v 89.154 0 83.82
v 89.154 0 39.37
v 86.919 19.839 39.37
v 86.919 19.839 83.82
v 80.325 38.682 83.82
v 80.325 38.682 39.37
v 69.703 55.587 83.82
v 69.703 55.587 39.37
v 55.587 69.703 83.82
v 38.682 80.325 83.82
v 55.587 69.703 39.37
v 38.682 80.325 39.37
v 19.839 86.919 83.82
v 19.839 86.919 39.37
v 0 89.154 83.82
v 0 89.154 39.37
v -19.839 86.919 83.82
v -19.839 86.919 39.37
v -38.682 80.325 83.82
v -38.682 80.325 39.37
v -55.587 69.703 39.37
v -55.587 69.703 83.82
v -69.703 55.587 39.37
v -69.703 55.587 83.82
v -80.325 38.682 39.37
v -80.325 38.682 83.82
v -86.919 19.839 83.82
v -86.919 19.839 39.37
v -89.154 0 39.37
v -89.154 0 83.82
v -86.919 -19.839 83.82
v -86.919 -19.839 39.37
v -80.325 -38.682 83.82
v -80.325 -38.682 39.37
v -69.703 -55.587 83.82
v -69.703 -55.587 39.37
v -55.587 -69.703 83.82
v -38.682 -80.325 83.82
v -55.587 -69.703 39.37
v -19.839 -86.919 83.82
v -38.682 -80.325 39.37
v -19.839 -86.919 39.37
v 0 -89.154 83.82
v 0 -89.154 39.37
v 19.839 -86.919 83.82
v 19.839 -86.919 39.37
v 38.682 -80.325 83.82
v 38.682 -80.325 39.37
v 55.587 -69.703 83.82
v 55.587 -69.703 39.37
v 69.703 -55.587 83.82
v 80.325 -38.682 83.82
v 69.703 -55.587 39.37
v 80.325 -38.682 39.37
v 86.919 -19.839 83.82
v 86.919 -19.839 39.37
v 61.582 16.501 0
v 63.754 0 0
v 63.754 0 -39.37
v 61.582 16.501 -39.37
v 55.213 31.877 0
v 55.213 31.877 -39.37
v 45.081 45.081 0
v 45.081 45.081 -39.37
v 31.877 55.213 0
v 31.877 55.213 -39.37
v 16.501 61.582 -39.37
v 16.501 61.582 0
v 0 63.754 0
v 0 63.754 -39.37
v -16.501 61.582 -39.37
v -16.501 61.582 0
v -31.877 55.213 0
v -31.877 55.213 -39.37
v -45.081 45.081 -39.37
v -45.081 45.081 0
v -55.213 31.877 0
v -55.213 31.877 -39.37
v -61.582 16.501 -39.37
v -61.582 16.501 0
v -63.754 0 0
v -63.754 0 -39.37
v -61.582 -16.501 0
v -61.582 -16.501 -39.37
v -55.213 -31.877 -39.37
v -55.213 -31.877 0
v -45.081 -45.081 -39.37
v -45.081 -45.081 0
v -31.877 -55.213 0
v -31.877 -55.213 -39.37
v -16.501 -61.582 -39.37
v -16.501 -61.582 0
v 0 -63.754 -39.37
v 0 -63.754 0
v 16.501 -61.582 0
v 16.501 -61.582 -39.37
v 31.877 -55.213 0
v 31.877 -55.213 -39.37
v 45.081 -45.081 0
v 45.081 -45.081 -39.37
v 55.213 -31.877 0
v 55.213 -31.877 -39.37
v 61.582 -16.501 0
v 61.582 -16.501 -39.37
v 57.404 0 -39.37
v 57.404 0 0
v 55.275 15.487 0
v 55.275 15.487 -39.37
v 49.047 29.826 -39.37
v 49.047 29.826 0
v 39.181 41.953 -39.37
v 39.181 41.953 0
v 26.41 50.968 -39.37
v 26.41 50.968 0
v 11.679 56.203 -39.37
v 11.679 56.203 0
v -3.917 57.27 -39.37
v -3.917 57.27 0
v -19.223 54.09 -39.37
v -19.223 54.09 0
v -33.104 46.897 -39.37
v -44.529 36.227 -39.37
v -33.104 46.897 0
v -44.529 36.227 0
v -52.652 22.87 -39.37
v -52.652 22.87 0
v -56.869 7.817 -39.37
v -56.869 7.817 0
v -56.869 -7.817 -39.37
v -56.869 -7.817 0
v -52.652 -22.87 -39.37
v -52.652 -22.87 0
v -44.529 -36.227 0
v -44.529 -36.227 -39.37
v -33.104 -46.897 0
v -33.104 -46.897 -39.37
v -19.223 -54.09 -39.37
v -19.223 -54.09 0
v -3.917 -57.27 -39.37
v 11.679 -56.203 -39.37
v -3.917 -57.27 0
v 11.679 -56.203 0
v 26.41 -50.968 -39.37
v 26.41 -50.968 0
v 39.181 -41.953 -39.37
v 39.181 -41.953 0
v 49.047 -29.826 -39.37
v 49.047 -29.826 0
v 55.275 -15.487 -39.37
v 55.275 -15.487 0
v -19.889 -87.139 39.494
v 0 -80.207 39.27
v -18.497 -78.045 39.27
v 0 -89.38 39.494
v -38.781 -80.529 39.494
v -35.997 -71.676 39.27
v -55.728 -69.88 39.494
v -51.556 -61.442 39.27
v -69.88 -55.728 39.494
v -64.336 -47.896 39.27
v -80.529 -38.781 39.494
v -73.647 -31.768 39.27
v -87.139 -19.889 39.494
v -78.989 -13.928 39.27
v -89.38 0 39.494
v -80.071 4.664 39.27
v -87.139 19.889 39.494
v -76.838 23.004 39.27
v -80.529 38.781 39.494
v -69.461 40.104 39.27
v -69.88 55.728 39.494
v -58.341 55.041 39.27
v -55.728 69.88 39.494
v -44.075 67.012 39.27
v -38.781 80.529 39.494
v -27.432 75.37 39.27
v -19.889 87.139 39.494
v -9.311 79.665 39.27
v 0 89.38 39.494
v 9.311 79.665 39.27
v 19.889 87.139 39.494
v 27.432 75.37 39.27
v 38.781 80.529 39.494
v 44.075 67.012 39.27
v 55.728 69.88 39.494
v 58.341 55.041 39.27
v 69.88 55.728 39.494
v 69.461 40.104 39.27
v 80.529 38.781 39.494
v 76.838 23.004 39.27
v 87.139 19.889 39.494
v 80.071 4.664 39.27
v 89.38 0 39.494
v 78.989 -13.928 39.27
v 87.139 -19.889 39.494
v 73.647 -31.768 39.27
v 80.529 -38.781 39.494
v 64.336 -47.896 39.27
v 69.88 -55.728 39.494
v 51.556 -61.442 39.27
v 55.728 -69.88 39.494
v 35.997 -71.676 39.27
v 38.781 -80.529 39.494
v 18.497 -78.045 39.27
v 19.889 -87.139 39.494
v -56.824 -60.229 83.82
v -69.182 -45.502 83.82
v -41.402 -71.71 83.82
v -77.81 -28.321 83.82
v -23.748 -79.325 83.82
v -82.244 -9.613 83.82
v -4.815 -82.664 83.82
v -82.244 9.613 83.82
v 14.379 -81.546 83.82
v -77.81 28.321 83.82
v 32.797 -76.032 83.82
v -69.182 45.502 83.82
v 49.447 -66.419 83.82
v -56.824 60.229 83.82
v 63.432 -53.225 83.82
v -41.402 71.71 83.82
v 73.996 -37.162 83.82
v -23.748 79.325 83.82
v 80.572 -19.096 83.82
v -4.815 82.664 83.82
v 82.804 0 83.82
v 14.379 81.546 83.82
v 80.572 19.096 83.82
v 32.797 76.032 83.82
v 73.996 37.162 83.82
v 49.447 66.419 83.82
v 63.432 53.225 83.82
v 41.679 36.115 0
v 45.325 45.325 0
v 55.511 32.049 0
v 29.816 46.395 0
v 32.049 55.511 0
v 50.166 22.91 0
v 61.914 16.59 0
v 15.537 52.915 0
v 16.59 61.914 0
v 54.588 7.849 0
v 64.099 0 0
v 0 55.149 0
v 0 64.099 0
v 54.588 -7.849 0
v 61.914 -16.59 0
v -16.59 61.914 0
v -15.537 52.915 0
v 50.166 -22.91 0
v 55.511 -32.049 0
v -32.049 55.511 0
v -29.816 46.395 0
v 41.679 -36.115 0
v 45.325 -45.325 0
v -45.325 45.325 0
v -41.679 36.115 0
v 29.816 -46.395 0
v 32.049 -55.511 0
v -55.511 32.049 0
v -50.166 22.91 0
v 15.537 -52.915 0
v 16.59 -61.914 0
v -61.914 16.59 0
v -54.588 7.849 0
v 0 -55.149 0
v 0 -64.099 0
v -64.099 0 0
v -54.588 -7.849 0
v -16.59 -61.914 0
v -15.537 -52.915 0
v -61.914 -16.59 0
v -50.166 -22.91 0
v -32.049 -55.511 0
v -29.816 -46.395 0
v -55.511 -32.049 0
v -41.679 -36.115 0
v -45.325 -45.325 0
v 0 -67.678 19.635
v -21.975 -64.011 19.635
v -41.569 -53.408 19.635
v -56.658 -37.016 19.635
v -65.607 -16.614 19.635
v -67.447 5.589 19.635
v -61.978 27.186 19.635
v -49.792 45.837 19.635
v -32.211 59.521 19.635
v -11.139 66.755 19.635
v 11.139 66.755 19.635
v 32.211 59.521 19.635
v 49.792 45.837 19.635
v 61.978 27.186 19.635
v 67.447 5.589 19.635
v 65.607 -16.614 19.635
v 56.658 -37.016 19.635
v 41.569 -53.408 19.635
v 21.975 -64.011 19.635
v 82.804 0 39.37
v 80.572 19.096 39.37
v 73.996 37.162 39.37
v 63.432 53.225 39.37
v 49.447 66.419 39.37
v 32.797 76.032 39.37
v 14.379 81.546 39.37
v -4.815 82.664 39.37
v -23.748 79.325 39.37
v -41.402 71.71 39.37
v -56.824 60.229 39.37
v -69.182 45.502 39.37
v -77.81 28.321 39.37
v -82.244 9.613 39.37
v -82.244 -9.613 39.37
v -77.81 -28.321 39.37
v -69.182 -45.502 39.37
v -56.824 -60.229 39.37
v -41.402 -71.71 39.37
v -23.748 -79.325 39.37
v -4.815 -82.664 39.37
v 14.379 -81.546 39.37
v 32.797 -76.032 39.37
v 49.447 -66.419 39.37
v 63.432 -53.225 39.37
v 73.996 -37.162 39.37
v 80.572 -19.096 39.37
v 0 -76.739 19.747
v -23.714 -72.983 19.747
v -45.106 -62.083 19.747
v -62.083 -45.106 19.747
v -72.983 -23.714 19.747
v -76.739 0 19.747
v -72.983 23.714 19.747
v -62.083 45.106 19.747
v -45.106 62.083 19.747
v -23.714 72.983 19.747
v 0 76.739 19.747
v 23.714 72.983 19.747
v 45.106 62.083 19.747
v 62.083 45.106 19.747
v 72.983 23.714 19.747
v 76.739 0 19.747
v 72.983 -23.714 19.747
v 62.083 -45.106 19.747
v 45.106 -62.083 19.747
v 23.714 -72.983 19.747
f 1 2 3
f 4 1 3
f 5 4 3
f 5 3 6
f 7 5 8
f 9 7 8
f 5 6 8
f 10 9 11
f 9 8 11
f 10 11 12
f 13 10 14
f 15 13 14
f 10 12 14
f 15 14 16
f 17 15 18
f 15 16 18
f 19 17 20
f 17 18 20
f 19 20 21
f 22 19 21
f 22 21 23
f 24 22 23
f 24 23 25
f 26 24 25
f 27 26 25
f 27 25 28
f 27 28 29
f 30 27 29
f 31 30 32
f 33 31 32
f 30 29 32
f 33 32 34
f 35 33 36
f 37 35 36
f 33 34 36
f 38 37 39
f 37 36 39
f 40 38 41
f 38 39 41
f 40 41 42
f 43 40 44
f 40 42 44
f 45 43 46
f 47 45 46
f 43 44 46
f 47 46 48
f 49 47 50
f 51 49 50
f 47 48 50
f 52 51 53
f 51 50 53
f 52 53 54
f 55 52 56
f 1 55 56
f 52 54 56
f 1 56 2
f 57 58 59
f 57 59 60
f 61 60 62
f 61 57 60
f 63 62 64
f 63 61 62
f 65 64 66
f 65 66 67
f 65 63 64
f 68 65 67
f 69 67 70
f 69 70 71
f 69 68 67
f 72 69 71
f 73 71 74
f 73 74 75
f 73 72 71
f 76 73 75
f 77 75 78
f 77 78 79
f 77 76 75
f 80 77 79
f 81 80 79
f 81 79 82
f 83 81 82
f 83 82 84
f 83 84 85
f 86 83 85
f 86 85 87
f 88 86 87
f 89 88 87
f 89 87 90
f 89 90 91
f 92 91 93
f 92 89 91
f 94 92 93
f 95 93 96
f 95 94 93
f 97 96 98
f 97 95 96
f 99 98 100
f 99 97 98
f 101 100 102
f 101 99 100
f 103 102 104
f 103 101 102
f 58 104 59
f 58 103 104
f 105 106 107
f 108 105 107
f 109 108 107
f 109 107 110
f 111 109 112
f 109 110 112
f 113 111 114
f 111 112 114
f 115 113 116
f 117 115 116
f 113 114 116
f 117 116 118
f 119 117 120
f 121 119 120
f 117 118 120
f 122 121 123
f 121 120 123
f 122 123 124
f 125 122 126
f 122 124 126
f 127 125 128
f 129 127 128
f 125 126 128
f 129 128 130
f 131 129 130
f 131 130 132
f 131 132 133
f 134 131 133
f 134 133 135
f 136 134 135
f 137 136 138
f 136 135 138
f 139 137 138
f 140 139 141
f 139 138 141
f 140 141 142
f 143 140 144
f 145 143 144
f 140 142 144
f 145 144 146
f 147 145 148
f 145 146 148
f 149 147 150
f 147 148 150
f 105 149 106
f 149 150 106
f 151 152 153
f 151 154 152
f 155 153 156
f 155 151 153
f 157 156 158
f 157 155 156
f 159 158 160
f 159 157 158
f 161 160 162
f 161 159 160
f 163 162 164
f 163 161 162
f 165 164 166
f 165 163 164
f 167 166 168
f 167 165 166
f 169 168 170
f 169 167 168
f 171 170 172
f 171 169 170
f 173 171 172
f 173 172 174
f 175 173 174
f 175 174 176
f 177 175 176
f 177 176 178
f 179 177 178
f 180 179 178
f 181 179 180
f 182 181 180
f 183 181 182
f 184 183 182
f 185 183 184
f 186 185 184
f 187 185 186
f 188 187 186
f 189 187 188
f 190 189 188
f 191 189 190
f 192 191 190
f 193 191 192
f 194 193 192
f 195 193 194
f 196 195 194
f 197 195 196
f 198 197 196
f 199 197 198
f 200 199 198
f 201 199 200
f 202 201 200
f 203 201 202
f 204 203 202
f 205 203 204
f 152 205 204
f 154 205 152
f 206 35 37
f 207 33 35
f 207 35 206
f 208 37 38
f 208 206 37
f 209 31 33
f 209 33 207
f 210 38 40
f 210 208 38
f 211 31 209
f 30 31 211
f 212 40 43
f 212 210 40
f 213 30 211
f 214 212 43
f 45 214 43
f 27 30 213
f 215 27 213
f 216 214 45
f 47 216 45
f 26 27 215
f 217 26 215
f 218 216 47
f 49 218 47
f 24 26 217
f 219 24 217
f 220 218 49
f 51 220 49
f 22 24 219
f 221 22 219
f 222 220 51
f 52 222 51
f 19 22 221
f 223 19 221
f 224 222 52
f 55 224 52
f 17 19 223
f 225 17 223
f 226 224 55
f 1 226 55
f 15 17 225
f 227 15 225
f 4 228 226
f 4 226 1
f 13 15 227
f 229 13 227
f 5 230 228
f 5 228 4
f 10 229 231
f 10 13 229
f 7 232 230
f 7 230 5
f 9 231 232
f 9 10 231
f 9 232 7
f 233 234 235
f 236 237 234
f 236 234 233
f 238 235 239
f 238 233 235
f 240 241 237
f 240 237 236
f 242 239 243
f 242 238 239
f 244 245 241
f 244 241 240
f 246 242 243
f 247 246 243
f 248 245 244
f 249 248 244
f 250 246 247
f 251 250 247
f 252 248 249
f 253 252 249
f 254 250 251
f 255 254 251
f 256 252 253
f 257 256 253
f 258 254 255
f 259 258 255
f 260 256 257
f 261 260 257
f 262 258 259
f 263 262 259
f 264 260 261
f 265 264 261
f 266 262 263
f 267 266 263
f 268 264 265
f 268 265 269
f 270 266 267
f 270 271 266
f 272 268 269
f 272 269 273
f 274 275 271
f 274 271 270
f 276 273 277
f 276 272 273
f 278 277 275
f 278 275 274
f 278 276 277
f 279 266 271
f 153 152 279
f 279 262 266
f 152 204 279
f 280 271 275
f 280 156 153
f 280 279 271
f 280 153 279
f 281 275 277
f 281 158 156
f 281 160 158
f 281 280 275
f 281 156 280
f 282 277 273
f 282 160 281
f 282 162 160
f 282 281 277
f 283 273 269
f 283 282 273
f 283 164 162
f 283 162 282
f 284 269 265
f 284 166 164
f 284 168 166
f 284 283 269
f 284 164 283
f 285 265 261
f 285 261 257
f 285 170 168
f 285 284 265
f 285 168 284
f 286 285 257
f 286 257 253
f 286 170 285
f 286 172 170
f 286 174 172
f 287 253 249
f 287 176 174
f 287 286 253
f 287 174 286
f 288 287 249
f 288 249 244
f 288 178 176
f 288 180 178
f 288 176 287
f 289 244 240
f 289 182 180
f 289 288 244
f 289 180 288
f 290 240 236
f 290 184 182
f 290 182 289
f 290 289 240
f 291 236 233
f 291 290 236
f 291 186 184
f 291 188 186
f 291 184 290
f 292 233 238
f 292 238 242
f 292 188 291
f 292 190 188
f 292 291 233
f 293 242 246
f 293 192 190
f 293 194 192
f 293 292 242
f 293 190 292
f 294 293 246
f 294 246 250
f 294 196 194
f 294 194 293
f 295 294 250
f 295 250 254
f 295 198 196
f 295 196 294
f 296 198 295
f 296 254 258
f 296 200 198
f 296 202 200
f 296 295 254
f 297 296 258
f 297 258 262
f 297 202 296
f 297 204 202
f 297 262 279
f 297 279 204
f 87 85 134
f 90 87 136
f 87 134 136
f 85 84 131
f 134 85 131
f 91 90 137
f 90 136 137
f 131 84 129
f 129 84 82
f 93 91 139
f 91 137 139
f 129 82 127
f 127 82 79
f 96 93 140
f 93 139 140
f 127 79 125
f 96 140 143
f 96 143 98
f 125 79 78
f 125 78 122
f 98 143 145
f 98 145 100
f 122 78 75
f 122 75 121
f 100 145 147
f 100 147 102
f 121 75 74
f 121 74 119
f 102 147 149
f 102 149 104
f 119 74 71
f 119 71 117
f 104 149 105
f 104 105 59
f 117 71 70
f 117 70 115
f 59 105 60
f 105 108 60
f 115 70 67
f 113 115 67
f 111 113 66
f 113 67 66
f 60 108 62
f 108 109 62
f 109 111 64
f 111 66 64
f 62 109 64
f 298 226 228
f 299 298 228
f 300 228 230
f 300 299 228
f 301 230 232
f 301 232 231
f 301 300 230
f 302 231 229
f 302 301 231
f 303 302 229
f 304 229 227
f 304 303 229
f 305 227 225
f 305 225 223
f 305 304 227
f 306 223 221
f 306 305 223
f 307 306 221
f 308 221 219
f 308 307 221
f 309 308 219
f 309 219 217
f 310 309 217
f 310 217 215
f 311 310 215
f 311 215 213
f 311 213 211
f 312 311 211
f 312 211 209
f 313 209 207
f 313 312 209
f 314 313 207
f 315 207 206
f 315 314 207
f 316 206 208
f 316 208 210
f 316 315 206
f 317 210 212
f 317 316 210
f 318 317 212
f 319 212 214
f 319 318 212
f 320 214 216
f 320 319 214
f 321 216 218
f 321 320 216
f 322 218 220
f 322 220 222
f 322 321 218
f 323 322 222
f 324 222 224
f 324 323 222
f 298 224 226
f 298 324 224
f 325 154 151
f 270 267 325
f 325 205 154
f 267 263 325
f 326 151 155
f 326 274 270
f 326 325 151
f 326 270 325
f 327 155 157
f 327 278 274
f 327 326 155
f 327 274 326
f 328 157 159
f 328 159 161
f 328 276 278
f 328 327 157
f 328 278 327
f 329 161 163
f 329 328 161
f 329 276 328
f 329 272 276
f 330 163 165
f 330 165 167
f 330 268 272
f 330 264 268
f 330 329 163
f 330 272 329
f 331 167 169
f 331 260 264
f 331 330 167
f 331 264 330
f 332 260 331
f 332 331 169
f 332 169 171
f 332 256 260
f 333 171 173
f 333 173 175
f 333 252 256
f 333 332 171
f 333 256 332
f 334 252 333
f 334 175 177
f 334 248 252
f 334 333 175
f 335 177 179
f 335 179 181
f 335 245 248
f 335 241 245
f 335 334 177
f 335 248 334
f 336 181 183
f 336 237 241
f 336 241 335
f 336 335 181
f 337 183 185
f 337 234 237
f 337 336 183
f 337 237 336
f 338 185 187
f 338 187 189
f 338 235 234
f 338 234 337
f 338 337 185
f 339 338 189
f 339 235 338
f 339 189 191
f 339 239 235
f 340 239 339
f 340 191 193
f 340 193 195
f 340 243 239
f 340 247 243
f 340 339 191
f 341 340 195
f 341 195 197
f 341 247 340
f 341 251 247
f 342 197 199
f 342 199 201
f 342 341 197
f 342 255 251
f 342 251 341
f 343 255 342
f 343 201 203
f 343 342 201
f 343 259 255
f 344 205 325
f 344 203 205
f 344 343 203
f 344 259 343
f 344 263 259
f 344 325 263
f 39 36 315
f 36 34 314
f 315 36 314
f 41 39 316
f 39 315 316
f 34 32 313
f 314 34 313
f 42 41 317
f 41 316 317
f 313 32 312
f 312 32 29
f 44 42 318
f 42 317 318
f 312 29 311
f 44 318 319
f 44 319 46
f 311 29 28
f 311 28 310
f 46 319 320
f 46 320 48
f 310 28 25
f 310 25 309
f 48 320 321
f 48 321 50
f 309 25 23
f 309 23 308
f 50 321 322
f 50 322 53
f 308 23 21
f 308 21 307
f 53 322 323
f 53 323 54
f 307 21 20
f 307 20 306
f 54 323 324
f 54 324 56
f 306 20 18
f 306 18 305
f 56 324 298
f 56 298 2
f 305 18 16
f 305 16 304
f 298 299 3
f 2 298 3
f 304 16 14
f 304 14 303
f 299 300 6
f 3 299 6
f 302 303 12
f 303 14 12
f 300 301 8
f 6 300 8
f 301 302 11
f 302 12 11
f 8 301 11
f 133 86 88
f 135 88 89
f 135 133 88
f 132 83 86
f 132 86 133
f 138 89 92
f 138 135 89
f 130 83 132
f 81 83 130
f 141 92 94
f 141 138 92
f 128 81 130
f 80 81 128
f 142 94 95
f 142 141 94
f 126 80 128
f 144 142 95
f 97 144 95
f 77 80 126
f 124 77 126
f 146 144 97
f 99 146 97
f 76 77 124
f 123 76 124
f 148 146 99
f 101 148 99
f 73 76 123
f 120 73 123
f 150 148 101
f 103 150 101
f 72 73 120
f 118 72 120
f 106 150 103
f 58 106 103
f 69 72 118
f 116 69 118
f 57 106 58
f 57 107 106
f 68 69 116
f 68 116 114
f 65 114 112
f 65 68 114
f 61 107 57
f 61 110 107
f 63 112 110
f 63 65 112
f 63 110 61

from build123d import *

# Parameters (mm, degrees)
F1_R     = 63.754
F2_DEPTH = 39.37
F0_R     = 57.404
F3_DEPTH = 39.37
F5_R     = 89.154
F5_R_2   = 82.804
F6_DEPTH = 44.45


with BuildPart() as f2:
    # F1 (on Top) → F2 (new body)
    with BuildSketch(Plane.XY):
        Circle(F1_R)
    extrude(amount=-F2_DEPTH)

    # F0 (on Top) → F3 (cut)
    with BuildSketch(Plane.XY):
        Circle(F0_R)
    extrude(amount=-F3_DEPTH, mode=Mode.SUBTRACT)


with BuildPart() as f6:
    # F5 (on offset) → F6 (new body)
    with BuildSketch(Plane.XY.offset(39.37)):
        Circle(F5_R)
        Circle(F5_R_2, mode=Mode.SUBTRACT)
    extrude(amount=F6_DEPTH)


with BuildPart() as f8:
    # F7 (on Right) → F8 (revolve)
    with BuildSketch(Plane.YZ):
        Polygon((-80.207095, 39.269883), (-89.380011, 39.493617), (-64.098559, 0), (-55.149369, 0), align=None)
    revolve(axis=Axis((0, 0, 19.411214), (0, 0, -1)))


solid = Compound([f2.part, f6.part, f8.part])
